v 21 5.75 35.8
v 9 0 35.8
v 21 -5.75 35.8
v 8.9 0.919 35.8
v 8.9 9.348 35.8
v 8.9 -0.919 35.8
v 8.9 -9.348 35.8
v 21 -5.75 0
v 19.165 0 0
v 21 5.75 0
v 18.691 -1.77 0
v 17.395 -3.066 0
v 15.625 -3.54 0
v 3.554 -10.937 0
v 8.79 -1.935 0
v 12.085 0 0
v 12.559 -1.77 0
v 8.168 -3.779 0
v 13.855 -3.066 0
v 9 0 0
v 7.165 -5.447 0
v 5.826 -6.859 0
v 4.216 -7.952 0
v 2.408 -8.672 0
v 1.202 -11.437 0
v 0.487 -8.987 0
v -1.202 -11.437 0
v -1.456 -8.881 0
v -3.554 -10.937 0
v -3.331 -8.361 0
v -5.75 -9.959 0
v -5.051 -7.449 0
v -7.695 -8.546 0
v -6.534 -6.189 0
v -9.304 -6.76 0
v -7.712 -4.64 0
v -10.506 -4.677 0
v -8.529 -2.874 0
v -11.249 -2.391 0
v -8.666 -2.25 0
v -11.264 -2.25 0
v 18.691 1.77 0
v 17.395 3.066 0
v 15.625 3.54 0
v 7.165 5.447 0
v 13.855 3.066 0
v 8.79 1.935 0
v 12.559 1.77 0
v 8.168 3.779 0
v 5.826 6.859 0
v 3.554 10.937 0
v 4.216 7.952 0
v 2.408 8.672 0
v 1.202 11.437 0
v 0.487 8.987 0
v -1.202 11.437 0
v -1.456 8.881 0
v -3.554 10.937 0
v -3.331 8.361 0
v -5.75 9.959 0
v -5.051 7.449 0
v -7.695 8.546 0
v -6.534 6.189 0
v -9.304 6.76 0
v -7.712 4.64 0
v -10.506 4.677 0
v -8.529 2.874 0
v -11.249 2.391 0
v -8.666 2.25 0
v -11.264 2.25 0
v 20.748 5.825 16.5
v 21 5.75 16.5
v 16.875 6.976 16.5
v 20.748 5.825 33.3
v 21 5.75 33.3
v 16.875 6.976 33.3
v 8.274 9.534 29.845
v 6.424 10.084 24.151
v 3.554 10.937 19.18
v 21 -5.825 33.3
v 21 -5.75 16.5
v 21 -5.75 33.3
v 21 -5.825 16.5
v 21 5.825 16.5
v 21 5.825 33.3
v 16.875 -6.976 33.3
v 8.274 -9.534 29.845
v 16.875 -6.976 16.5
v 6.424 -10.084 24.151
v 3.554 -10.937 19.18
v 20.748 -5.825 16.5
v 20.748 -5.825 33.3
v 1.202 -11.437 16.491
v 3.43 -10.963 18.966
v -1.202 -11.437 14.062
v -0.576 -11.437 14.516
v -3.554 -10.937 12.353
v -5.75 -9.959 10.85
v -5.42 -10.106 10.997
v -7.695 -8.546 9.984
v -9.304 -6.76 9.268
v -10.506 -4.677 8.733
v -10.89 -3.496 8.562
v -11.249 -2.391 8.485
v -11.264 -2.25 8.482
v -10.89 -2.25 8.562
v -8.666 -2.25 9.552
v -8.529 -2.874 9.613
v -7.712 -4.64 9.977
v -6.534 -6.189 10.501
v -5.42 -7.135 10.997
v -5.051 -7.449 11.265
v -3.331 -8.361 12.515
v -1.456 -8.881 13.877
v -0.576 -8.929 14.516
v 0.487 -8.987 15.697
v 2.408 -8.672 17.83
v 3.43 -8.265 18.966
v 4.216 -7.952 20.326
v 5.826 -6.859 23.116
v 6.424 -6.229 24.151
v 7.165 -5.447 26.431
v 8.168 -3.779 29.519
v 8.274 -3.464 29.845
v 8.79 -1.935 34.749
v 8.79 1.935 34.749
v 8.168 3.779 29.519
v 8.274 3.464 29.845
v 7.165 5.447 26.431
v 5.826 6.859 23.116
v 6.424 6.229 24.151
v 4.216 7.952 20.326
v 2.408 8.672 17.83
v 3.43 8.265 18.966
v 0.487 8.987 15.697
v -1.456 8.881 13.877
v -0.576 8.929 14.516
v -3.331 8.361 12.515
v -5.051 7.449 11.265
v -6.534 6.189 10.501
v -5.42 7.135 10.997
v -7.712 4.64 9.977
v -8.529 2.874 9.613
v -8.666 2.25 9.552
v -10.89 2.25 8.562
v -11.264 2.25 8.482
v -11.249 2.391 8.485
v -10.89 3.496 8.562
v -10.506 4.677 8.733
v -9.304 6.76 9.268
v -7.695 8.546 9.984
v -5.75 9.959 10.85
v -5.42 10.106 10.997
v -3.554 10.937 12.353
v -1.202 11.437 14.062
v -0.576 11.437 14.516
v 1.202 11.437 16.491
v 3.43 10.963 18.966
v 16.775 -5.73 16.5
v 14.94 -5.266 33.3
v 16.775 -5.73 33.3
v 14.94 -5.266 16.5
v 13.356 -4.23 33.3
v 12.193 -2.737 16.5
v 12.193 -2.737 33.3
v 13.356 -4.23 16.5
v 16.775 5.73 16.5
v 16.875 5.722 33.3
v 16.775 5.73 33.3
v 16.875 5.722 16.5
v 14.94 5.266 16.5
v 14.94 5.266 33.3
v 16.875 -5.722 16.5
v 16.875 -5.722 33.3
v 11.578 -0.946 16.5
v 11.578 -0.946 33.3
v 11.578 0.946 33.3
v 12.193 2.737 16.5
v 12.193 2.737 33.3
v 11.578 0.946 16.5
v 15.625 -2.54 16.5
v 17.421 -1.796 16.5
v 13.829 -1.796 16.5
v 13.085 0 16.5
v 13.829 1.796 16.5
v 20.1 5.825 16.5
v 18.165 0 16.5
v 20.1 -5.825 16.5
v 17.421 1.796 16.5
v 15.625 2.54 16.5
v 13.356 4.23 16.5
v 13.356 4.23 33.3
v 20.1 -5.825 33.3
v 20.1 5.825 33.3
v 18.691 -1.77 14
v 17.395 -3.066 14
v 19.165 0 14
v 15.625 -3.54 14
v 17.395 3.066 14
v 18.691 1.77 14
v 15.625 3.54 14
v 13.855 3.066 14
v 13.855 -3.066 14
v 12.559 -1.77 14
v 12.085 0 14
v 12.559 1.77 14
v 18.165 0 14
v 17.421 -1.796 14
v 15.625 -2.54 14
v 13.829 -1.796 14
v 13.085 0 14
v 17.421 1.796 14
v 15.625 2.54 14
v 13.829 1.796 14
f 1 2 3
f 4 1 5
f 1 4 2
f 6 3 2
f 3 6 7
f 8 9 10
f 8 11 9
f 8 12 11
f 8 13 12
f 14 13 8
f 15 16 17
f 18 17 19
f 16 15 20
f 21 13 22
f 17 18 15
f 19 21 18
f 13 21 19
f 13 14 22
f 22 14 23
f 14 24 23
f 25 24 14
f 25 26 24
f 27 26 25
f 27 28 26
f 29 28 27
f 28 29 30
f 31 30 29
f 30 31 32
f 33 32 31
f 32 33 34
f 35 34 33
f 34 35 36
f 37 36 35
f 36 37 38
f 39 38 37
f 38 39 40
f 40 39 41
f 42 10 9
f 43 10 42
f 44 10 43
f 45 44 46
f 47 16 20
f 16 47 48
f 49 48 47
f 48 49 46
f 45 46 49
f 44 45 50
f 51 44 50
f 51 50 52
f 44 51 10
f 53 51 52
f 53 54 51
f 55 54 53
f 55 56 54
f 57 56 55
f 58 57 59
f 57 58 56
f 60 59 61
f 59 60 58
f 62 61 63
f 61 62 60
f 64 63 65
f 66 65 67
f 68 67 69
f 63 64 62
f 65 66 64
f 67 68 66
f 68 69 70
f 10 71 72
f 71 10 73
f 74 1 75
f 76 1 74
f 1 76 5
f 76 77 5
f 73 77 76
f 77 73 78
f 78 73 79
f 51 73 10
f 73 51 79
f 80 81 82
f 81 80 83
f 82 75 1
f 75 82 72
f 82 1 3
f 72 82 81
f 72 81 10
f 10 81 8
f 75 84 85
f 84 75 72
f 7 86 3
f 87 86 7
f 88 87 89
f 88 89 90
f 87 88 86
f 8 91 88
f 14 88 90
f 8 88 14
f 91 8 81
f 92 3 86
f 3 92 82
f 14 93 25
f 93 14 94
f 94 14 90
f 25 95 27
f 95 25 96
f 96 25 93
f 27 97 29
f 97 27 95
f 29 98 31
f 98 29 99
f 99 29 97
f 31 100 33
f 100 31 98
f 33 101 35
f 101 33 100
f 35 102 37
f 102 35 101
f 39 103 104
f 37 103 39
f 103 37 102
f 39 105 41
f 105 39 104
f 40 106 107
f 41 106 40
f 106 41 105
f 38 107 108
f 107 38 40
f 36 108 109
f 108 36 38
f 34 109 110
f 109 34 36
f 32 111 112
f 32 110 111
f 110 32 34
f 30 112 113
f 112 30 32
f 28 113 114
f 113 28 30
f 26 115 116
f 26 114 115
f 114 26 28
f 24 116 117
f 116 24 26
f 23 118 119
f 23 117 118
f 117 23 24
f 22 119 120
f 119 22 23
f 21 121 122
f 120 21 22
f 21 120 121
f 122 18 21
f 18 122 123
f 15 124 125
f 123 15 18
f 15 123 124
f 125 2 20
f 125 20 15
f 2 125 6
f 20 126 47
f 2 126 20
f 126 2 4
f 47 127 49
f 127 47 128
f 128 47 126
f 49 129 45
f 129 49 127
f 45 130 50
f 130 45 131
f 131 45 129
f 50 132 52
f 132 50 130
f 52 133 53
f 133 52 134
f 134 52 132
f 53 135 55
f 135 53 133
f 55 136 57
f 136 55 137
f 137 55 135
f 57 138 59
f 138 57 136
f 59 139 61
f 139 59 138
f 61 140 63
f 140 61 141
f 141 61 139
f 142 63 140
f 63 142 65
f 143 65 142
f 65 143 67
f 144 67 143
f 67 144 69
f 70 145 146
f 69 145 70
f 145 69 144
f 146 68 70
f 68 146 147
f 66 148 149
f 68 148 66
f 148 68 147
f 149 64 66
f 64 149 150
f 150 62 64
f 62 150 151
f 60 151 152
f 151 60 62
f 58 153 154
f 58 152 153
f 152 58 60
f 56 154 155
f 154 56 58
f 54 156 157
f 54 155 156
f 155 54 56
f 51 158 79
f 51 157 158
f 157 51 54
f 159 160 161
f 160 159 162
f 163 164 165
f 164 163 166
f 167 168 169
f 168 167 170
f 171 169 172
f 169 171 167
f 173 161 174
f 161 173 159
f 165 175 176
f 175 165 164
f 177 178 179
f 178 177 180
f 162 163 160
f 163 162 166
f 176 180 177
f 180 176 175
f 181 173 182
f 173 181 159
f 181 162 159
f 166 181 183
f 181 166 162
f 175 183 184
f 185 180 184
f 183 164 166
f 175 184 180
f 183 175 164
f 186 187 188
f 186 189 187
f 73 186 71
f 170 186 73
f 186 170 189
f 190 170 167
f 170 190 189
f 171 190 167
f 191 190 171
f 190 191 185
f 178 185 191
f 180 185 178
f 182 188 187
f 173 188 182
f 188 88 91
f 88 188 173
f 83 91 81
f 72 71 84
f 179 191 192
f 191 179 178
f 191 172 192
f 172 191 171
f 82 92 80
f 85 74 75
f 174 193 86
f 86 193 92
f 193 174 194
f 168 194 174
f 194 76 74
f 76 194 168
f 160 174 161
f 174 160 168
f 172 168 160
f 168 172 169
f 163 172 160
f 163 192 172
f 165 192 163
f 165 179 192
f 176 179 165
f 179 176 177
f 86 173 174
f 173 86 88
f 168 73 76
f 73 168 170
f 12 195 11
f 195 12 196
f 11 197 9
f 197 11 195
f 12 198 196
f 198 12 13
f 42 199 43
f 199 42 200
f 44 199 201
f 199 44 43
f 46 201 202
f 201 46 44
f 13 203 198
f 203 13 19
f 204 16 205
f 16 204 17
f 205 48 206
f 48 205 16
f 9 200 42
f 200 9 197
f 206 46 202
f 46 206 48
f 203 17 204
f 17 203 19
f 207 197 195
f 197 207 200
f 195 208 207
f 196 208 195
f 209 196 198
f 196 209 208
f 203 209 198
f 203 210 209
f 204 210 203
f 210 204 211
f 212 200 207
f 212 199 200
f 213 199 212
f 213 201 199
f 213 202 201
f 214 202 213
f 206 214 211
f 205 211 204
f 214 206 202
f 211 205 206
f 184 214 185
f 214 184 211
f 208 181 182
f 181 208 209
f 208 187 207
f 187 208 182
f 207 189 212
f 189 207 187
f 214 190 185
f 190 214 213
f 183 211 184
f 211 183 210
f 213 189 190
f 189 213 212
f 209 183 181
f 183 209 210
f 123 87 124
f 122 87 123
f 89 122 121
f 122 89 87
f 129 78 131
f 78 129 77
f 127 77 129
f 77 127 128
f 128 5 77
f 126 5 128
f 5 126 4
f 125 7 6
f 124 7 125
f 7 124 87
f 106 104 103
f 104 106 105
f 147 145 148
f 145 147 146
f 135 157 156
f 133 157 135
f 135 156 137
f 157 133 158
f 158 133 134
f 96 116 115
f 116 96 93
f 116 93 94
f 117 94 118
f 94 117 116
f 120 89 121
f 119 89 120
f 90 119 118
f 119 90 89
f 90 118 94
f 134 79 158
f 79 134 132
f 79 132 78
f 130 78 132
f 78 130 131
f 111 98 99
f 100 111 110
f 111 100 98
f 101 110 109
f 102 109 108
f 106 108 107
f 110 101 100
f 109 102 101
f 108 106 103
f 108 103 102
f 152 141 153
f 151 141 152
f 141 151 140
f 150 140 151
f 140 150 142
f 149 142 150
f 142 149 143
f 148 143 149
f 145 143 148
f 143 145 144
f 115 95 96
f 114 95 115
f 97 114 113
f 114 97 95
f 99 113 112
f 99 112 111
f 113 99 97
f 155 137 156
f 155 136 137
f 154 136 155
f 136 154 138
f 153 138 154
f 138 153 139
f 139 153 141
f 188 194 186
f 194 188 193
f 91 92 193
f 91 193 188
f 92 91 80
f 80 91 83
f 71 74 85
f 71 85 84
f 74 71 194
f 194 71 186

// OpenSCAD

fingerWidth = 18; 
// your button cell's diameter.  (LR44 is 11.5)
batteryWidth = 11.5;  
// your button cell's height.  
batteryHeight = 5.6; 	
// need about 5 volts to work a laser, usually 3 batteries should do it.
batteryCount = 3; 		
// laser module's diameter
laserWidth = 7.08; 	
// laser modules length
laserHeight = 14;		
// how thick the walls are
thickness= 2.5;

batterySlot  = batteryHeight *batteryCount;
ringLength = (batterySlot) +( laserHeight+ thickness*2 );

translate([0,0,ringLength ] ) rotate([180, 0, 0]) laserRing();

module laserRing(){

	
	difference(){
		linear_extrude(height = ringLength) {
			face();
		}
		
		//battery slot
		translate([fingerWidth/2 + batteryWidth/2 +thickness  ,0,thickness]){
			cylinder(r = batteryWidth/2,  h = batterySlot  );
		
		}
		translate([fingerWidth/2 +batteryWidth/2 + thickness*2   ,0,thickness+ batterySlot/2]){
				cube([batteryWidth/2, batteryWidth*2, batterySlot], center=true);
			
		}
		//Laser Slot
		translate([fingerWidth/2 + batteryWidth/4 +thickness*1.5,0 ,thickness*2 +batterySlot  ]){
			cylinder(r=laserWidth/2, h =laserHeight );			
		}
		translate([fingerWidth/2 + batteryWidth/4 +thickness*1.5  ,0,thickness+batterySlot ]){
			cylinder(r=laserWidth/2-1, h =laserHeight +thickness);			
		}
		
		//
		translate([-(ringLength * .6)/2 - fingerWidth/2, 50, 0] ) rotate([90, 0, 0])
		cylinder(r = ringLength * .8, h = 100);
		
	}
	//support
	translate([fingerWidth/2 +batteryWidth/2 + thickness*2+ .8, 0, thickness+ batterySlot/2])
		cube([.9, batteryWidth/2 +thickness*2+.9, batterySlot], center = true) ;
}

module face(){

	difference(){
		hull(){	
			circle(r = fingerWidth/2 + thickness)  ;
			
			translate([ fingerWidth/2 + thickness/2, -(batteryWidth )/2, 0])
			square([batteryWidth/2 +thickness*2, (batteryWidth )]);
		}
		circle(r = fingerWidth/2);	
		translate([-fingerWidth/2, 0, 0]){
			square([fingerWidth,fingerWidth*.25], center = true);
		}
		
	}

}
